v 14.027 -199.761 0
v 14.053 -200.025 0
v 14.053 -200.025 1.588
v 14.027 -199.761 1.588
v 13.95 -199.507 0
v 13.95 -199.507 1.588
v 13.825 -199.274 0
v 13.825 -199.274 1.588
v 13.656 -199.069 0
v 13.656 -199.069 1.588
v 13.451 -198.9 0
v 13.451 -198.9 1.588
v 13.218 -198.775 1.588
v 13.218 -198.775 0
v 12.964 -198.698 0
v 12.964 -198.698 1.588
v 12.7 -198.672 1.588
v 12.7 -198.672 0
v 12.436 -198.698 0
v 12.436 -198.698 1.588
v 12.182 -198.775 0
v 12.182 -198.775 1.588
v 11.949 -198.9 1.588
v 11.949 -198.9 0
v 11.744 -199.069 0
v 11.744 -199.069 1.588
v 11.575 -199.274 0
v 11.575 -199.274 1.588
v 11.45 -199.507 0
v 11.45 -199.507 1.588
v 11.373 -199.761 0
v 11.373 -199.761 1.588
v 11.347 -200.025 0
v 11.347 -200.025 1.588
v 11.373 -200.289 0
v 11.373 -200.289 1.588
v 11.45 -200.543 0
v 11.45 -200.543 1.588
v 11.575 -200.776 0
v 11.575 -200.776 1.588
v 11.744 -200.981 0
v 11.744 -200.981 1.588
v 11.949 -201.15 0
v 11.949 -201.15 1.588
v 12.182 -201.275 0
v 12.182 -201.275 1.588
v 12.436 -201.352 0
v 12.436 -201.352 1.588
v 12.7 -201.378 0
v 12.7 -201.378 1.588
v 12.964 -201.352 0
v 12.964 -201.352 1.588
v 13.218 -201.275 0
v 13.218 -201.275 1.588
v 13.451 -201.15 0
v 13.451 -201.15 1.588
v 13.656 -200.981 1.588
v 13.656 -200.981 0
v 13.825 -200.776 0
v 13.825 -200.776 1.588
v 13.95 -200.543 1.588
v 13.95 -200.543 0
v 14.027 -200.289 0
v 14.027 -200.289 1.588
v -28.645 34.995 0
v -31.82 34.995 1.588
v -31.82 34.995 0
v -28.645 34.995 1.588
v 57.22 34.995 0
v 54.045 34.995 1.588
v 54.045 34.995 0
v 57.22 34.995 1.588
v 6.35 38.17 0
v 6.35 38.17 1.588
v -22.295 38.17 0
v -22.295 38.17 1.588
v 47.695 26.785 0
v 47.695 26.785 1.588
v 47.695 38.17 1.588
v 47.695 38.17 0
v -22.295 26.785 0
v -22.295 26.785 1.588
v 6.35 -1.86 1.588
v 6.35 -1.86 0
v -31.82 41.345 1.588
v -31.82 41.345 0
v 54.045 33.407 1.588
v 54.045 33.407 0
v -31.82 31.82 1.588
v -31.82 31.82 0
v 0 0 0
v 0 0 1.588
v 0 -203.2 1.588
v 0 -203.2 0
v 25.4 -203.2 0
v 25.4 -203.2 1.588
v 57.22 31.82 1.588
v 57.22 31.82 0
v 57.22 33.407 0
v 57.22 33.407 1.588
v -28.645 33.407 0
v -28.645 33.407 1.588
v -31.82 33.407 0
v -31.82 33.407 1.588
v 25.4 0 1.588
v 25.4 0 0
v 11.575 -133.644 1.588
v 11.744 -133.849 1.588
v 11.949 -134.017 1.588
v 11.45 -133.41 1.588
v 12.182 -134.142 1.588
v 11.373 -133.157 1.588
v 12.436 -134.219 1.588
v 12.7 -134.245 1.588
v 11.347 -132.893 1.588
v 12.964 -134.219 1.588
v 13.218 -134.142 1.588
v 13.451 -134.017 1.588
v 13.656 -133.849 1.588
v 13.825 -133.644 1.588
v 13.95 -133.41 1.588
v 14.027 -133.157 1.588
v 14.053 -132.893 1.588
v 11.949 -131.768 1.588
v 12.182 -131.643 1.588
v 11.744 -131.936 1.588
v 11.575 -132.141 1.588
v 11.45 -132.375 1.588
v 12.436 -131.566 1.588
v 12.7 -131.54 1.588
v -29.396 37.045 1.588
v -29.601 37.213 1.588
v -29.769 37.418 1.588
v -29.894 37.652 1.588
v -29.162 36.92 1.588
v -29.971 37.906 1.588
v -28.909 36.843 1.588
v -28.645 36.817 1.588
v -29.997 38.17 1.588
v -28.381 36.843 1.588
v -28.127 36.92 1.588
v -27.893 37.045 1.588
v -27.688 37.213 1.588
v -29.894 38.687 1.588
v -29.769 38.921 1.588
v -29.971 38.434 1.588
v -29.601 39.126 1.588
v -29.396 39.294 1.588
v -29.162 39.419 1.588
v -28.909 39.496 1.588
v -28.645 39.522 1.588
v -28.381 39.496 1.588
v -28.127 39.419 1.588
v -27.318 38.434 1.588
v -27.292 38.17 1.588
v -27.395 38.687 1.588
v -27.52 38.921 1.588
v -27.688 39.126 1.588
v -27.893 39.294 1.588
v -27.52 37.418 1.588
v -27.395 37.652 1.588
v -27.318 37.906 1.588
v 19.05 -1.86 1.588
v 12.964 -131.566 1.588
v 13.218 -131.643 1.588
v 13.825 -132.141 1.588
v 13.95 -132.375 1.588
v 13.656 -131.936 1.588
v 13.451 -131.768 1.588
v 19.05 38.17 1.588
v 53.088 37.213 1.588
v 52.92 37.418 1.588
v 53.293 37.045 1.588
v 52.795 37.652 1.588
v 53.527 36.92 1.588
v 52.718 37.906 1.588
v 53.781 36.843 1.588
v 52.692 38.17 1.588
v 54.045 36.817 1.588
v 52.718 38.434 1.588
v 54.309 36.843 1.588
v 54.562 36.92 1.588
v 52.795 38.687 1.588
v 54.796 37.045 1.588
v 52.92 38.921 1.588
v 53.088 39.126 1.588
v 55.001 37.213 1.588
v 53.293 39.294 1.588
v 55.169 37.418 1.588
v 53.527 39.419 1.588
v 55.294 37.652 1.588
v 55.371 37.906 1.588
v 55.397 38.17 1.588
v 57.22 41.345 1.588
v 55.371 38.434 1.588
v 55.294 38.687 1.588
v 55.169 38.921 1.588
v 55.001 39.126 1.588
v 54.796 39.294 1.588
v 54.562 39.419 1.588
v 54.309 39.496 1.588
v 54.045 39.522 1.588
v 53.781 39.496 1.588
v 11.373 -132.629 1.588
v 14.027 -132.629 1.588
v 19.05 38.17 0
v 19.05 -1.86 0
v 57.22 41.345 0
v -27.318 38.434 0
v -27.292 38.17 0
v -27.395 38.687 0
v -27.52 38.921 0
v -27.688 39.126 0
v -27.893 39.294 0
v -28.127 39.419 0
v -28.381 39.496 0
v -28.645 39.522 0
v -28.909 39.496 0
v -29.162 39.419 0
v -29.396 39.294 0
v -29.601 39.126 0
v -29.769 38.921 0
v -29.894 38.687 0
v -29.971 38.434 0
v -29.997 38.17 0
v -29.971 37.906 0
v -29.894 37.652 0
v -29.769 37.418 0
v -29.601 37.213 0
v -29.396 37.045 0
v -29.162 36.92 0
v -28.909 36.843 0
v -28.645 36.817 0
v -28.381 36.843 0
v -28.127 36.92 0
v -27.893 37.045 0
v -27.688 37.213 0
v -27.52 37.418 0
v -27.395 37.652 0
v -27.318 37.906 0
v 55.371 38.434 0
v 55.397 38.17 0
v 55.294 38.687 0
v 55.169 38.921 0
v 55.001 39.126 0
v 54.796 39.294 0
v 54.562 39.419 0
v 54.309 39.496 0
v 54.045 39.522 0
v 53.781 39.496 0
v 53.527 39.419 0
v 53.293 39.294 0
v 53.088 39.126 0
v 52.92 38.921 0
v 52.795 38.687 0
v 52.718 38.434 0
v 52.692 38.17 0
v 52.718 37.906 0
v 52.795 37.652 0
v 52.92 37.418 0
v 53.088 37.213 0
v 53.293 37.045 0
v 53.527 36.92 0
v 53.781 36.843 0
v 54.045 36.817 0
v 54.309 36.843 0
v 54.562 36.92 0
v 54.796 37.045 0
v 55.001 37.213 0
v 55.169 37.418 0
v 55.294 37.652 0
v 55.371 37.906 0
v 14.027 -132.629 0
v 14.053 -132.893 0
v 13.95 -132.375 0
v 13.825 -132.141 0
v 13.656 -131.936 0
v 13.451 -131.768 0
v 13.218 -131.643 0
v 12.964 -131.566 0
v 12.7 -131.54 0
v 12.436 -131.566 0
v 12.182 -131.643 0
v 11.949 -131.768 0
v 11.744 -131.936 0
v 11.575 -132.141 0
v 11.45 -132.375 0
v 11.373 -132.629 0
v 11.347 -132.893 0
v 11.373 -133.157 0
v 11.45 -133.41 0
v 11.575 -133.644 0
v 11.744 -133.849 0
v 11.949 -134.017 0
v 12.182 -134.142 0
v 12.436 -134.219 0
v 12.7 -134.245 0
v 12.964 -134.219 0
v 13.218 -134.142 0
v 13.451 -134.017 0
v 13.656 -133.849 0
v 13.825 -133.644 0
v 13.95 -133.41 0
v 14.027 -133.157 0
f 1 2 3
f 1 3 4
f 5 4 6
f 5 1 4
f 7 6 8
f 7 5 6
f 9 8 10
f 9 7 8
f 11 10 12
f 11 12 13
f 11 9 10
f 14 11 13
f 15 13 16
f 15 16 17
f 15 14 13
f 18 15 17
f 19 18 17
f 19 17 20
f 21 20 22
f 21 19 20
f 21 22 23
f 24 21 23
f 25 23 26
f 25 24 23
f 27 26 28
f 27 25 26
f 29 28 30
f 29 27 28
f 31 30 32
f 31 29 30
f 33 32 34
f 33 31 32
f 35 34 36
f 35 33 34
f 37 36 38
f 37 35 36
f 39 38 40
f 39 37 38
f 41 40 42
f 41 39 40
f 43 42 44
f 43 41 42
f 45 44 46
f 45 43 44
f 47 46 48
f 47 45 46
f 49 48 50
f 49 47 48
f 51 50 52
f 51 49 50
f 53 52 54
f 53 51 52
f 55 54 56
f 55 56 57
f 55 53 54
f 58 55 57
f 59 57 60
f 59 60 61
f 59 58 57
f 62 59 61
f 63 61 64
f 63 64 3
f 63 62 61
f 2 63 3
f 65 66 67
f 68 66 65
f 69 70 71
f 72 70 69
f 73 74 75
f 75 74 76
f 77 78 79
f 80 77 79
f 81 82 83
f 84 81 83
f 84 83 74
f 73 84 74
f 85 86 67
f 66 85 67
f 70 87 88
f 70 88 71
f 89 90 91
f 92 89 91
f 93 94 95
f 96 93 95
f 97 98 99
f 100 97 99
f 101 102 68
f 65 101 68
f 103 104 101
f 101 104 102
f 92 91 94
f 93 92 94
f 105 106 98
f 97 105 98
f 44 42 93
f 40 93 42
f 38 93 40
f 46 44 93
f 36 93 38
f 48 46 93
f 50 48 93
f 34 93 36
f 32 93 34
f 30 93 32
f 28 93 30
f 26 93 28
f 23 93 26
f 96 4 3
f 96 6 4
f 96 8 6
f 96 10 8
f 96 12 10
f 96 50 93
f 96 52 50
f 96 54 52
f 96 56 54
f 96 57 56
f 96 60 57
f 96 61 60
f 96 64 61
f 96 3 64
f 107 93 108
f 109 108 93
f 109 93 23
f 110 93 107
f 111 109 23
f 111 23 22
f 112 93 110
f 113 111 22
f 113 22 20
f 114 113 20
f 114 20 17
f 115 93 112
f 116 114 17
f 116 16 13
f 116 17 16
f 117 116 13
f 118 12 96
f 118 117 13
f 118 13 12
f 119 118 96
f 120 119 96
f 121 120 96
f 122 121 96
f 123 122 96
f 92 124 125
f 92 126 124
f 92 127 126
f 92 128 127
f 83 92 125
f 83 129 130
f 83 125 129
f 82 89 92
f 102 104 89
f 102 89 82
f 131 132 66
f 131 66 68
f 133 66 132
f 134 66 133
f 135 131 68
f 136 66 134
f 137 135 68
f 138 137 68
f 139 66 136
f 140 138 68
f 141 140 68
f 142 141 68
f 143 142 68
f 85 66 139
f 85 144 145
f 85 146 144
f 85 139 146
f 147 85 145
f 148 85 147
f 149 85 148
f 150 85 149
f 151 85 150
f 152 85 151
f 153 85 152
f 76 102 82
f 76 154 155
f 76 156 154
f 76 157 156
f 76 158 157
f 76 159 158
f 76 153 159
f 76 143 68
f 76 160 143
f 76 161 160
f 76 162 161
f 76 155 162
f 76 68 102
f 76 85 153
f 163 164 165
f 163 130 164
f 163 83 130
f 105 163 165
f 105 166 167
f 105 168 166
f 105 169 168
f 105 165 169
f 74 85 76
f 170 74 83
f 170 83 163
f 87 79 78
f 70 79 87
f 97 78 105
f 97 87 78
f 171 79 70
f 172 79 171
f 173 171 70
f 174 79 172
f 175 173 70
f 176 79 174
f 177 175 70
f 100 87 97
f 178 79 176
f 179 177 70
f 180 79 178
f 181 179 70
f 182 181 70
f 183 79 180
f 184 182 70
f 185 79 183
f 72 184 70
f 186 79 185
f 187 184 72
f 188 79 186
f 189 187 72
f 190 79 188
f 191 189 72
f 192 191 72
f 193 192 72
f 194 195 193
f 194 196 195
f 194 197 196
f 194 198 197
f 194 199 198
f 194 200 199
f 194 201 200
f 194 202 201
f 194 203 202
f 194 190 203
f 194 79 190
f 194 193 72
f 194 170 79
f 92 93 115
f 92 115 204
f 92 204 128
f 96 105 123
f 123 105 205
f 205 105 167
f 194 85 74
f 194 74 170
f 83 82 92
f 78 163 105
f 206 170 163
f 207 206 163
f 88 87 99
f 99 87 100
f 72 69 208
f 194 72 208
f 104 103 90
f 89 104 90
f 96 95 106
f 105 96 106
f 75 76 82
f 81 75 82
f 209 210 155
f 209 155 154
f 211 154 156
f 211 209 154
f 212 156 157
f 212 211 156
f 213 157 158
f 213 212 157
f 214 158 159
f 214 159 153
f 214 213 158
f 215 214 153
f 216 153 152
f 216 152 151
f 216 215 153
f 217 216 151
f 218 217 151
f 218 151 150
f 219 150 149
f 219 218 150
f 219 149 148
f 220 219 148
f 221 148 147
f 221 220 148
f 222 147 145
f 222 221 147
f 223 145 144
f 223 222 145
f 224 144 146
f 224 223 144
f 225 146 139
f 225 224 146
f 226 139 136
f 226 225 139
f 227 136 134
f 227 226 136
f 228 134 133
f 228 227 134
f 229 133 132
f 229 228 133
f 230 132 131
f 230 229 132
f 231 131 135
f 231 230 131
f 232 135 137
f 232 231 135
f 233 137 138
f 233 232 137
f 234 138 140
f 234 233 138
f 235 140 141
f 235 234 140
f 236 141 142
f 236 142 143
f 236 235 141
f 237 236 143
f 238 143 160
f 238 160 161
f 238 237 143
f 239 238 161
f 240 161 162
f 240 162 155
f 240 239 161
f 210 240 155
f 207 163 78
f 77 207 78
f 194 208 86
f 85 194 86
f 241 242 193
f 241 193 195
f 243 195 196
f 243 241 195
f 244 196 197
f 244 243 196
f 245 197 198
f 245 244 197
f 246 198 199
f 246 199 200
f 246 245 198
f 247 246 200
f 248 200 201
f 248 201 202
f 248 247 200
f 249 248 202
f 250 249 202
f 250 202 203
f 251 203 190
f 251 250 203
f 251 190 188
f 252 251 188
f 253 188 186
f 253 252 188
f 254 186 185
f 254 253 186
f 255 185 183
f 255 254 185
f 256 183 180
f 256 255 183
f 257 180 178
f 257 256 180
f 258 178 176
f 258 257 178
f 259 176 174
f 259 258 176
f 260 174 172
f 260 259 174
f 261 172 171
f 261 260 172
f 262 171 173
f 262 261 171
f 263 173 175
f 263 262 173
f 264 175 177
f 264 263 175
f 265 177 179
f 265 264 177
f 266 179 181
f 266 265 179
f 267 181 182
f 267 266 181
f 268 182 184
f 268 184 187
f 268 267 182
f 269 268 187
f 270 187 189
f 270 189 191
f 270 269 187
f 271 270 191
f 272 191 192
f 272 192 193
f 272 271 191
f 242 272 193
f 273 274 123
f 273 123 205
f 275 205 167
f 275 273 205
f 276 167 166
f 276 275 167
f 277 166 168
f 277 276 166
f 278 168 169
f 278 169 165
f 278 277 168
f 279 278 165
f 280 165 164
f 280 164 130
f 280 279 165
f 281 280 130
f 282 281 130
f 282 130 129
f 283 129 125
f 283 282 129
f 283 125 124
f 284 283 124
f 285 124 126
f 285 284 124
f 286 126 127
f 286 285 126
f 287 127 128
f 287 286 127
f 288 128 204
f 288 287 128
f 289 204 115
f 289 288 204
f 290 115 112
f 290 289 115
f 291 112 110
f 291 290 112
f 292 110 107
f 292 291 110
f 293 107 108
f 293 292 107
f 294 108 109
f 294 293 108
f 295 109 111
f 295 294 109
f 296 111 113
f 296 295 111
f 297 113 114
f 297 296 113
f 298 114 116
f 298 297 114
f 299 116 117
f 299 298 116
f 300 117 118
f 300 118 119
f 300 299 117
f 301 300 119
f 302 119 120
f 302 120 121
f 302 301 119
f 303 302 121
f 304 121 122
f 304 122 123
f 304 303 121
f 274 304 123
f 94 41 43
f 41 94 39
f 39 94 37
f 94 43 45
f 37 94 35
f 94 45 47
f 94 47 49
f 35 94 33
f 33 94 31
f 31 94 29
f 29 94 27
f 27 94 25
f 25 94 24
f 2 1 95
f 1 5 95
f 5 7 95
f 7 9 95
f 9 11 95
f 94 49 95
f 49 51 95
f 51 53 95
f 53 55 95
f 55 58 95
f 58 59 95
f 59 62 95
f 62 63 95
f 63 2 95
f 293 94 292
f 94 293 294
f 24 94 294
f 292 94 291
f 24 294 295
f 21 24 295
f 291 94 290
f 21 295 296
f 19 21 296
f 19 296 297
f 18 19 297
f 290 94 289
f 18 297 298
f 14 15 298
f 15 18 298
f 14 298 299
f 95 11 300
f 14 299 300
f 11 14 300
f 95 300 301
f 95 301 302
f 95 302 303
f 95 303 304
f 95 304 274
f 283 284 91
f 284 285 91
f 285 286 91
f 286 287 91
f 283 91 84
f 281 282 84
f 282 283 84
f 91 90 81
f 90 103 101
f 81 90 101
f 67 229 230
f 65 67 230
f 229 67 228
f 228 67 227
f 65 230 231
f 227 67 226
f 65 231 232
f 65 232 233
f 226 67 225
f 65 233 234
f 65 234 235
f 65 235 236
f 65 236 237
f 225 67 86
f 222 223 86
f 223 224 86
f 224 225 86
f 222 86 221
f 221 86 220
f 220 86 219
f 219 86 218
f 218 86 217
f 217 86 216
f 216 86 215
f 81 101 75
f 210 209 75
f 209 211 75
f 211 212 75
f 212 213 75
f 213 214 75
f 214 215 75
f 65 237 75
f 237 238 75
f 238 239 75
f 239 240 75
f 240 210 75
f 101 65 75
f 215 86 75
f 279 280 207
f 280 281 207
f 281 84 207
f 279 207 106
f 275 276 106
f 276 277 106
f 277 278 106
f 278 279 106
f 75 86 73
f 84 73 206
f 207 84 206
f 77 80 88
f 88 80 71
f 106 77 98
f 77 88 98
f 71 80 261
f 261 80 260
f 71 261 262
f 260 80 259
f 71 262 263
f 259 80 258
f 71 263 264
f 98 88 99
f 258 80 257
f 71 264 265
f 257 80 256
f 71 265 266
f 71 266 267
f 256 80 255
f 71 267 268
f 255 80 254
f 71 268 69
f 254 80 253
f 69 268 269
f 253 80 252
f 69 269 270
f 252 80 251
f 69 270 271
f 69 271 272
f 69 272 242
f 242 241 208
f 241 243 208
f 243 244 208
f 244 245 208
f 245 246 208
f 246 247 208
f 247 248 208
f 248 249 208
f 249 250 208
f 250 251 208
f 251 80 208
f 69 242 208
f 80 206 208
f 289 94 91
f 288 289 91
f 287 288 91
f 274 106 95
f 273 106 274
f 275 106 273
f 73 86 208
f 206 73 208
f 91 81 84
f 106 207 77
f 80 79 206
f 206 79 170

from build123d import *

# Parameters (mm, degrees)
F0_R     = 1.35255
F1_DEPTH = 1.5875
F2_W     = 3.175
F2_H     = 1.5875
F3_DEPTH = 1.5875


with BuildPart() as f1:
    # F0 (on Top) → F1 (new body)
    with BuildSketch(Plane.XY):
        Polygon((0, 0), (0, -203.2), (25.4, -203.2), (25.4, 0), (57.21985, 31.81985), (57.21985, 41.34485), (-31.81985, 41.34485), (-31.81985, 31.81985), align=None)
        with Locations((12.7, -200.025)):
            Circle(F0_R, mode=Mode.SUBTRACT)
        with Locations((12.7, -132.8928)):
            Circle(F0_R, mode=Mode.SUBTRACT)
        with Locations((-28.64485, 38.16985)):
            Circle(F0_R, mode=Mode.SUBTRACT)
        with Locations((54.04485, 38.16985)):
            Circle(F0_R, mode=Mode.SUBTRACT)
    extrude(amount=F1_DEPTH)

    # F2 (on face) → F3 (cut, through all)
    with BuildSketch(Plane.XY.offset(1.5875)):
        with Locations((-30.23235, 34.2011)):
            Rectangle(F2_W, F2_H)
        with Locations((55.63235, 34.2011)):
            Rectangle(F2_W, F2_H)
        Polygon((-22.29485, 38.16985), (-22.29485, 26.784978), (6.35, -1.859872), (6.35, 38.16985), align=None)
        Polygon((47.69485, 38.16985), (19.05, 38.16985), (19.05, -1.859872), (47.69485, 26.784978), align=None)
    extrude(amount=-F3_DEPTH, mode=Mode.SUBTRACT)


solid = f1.part
